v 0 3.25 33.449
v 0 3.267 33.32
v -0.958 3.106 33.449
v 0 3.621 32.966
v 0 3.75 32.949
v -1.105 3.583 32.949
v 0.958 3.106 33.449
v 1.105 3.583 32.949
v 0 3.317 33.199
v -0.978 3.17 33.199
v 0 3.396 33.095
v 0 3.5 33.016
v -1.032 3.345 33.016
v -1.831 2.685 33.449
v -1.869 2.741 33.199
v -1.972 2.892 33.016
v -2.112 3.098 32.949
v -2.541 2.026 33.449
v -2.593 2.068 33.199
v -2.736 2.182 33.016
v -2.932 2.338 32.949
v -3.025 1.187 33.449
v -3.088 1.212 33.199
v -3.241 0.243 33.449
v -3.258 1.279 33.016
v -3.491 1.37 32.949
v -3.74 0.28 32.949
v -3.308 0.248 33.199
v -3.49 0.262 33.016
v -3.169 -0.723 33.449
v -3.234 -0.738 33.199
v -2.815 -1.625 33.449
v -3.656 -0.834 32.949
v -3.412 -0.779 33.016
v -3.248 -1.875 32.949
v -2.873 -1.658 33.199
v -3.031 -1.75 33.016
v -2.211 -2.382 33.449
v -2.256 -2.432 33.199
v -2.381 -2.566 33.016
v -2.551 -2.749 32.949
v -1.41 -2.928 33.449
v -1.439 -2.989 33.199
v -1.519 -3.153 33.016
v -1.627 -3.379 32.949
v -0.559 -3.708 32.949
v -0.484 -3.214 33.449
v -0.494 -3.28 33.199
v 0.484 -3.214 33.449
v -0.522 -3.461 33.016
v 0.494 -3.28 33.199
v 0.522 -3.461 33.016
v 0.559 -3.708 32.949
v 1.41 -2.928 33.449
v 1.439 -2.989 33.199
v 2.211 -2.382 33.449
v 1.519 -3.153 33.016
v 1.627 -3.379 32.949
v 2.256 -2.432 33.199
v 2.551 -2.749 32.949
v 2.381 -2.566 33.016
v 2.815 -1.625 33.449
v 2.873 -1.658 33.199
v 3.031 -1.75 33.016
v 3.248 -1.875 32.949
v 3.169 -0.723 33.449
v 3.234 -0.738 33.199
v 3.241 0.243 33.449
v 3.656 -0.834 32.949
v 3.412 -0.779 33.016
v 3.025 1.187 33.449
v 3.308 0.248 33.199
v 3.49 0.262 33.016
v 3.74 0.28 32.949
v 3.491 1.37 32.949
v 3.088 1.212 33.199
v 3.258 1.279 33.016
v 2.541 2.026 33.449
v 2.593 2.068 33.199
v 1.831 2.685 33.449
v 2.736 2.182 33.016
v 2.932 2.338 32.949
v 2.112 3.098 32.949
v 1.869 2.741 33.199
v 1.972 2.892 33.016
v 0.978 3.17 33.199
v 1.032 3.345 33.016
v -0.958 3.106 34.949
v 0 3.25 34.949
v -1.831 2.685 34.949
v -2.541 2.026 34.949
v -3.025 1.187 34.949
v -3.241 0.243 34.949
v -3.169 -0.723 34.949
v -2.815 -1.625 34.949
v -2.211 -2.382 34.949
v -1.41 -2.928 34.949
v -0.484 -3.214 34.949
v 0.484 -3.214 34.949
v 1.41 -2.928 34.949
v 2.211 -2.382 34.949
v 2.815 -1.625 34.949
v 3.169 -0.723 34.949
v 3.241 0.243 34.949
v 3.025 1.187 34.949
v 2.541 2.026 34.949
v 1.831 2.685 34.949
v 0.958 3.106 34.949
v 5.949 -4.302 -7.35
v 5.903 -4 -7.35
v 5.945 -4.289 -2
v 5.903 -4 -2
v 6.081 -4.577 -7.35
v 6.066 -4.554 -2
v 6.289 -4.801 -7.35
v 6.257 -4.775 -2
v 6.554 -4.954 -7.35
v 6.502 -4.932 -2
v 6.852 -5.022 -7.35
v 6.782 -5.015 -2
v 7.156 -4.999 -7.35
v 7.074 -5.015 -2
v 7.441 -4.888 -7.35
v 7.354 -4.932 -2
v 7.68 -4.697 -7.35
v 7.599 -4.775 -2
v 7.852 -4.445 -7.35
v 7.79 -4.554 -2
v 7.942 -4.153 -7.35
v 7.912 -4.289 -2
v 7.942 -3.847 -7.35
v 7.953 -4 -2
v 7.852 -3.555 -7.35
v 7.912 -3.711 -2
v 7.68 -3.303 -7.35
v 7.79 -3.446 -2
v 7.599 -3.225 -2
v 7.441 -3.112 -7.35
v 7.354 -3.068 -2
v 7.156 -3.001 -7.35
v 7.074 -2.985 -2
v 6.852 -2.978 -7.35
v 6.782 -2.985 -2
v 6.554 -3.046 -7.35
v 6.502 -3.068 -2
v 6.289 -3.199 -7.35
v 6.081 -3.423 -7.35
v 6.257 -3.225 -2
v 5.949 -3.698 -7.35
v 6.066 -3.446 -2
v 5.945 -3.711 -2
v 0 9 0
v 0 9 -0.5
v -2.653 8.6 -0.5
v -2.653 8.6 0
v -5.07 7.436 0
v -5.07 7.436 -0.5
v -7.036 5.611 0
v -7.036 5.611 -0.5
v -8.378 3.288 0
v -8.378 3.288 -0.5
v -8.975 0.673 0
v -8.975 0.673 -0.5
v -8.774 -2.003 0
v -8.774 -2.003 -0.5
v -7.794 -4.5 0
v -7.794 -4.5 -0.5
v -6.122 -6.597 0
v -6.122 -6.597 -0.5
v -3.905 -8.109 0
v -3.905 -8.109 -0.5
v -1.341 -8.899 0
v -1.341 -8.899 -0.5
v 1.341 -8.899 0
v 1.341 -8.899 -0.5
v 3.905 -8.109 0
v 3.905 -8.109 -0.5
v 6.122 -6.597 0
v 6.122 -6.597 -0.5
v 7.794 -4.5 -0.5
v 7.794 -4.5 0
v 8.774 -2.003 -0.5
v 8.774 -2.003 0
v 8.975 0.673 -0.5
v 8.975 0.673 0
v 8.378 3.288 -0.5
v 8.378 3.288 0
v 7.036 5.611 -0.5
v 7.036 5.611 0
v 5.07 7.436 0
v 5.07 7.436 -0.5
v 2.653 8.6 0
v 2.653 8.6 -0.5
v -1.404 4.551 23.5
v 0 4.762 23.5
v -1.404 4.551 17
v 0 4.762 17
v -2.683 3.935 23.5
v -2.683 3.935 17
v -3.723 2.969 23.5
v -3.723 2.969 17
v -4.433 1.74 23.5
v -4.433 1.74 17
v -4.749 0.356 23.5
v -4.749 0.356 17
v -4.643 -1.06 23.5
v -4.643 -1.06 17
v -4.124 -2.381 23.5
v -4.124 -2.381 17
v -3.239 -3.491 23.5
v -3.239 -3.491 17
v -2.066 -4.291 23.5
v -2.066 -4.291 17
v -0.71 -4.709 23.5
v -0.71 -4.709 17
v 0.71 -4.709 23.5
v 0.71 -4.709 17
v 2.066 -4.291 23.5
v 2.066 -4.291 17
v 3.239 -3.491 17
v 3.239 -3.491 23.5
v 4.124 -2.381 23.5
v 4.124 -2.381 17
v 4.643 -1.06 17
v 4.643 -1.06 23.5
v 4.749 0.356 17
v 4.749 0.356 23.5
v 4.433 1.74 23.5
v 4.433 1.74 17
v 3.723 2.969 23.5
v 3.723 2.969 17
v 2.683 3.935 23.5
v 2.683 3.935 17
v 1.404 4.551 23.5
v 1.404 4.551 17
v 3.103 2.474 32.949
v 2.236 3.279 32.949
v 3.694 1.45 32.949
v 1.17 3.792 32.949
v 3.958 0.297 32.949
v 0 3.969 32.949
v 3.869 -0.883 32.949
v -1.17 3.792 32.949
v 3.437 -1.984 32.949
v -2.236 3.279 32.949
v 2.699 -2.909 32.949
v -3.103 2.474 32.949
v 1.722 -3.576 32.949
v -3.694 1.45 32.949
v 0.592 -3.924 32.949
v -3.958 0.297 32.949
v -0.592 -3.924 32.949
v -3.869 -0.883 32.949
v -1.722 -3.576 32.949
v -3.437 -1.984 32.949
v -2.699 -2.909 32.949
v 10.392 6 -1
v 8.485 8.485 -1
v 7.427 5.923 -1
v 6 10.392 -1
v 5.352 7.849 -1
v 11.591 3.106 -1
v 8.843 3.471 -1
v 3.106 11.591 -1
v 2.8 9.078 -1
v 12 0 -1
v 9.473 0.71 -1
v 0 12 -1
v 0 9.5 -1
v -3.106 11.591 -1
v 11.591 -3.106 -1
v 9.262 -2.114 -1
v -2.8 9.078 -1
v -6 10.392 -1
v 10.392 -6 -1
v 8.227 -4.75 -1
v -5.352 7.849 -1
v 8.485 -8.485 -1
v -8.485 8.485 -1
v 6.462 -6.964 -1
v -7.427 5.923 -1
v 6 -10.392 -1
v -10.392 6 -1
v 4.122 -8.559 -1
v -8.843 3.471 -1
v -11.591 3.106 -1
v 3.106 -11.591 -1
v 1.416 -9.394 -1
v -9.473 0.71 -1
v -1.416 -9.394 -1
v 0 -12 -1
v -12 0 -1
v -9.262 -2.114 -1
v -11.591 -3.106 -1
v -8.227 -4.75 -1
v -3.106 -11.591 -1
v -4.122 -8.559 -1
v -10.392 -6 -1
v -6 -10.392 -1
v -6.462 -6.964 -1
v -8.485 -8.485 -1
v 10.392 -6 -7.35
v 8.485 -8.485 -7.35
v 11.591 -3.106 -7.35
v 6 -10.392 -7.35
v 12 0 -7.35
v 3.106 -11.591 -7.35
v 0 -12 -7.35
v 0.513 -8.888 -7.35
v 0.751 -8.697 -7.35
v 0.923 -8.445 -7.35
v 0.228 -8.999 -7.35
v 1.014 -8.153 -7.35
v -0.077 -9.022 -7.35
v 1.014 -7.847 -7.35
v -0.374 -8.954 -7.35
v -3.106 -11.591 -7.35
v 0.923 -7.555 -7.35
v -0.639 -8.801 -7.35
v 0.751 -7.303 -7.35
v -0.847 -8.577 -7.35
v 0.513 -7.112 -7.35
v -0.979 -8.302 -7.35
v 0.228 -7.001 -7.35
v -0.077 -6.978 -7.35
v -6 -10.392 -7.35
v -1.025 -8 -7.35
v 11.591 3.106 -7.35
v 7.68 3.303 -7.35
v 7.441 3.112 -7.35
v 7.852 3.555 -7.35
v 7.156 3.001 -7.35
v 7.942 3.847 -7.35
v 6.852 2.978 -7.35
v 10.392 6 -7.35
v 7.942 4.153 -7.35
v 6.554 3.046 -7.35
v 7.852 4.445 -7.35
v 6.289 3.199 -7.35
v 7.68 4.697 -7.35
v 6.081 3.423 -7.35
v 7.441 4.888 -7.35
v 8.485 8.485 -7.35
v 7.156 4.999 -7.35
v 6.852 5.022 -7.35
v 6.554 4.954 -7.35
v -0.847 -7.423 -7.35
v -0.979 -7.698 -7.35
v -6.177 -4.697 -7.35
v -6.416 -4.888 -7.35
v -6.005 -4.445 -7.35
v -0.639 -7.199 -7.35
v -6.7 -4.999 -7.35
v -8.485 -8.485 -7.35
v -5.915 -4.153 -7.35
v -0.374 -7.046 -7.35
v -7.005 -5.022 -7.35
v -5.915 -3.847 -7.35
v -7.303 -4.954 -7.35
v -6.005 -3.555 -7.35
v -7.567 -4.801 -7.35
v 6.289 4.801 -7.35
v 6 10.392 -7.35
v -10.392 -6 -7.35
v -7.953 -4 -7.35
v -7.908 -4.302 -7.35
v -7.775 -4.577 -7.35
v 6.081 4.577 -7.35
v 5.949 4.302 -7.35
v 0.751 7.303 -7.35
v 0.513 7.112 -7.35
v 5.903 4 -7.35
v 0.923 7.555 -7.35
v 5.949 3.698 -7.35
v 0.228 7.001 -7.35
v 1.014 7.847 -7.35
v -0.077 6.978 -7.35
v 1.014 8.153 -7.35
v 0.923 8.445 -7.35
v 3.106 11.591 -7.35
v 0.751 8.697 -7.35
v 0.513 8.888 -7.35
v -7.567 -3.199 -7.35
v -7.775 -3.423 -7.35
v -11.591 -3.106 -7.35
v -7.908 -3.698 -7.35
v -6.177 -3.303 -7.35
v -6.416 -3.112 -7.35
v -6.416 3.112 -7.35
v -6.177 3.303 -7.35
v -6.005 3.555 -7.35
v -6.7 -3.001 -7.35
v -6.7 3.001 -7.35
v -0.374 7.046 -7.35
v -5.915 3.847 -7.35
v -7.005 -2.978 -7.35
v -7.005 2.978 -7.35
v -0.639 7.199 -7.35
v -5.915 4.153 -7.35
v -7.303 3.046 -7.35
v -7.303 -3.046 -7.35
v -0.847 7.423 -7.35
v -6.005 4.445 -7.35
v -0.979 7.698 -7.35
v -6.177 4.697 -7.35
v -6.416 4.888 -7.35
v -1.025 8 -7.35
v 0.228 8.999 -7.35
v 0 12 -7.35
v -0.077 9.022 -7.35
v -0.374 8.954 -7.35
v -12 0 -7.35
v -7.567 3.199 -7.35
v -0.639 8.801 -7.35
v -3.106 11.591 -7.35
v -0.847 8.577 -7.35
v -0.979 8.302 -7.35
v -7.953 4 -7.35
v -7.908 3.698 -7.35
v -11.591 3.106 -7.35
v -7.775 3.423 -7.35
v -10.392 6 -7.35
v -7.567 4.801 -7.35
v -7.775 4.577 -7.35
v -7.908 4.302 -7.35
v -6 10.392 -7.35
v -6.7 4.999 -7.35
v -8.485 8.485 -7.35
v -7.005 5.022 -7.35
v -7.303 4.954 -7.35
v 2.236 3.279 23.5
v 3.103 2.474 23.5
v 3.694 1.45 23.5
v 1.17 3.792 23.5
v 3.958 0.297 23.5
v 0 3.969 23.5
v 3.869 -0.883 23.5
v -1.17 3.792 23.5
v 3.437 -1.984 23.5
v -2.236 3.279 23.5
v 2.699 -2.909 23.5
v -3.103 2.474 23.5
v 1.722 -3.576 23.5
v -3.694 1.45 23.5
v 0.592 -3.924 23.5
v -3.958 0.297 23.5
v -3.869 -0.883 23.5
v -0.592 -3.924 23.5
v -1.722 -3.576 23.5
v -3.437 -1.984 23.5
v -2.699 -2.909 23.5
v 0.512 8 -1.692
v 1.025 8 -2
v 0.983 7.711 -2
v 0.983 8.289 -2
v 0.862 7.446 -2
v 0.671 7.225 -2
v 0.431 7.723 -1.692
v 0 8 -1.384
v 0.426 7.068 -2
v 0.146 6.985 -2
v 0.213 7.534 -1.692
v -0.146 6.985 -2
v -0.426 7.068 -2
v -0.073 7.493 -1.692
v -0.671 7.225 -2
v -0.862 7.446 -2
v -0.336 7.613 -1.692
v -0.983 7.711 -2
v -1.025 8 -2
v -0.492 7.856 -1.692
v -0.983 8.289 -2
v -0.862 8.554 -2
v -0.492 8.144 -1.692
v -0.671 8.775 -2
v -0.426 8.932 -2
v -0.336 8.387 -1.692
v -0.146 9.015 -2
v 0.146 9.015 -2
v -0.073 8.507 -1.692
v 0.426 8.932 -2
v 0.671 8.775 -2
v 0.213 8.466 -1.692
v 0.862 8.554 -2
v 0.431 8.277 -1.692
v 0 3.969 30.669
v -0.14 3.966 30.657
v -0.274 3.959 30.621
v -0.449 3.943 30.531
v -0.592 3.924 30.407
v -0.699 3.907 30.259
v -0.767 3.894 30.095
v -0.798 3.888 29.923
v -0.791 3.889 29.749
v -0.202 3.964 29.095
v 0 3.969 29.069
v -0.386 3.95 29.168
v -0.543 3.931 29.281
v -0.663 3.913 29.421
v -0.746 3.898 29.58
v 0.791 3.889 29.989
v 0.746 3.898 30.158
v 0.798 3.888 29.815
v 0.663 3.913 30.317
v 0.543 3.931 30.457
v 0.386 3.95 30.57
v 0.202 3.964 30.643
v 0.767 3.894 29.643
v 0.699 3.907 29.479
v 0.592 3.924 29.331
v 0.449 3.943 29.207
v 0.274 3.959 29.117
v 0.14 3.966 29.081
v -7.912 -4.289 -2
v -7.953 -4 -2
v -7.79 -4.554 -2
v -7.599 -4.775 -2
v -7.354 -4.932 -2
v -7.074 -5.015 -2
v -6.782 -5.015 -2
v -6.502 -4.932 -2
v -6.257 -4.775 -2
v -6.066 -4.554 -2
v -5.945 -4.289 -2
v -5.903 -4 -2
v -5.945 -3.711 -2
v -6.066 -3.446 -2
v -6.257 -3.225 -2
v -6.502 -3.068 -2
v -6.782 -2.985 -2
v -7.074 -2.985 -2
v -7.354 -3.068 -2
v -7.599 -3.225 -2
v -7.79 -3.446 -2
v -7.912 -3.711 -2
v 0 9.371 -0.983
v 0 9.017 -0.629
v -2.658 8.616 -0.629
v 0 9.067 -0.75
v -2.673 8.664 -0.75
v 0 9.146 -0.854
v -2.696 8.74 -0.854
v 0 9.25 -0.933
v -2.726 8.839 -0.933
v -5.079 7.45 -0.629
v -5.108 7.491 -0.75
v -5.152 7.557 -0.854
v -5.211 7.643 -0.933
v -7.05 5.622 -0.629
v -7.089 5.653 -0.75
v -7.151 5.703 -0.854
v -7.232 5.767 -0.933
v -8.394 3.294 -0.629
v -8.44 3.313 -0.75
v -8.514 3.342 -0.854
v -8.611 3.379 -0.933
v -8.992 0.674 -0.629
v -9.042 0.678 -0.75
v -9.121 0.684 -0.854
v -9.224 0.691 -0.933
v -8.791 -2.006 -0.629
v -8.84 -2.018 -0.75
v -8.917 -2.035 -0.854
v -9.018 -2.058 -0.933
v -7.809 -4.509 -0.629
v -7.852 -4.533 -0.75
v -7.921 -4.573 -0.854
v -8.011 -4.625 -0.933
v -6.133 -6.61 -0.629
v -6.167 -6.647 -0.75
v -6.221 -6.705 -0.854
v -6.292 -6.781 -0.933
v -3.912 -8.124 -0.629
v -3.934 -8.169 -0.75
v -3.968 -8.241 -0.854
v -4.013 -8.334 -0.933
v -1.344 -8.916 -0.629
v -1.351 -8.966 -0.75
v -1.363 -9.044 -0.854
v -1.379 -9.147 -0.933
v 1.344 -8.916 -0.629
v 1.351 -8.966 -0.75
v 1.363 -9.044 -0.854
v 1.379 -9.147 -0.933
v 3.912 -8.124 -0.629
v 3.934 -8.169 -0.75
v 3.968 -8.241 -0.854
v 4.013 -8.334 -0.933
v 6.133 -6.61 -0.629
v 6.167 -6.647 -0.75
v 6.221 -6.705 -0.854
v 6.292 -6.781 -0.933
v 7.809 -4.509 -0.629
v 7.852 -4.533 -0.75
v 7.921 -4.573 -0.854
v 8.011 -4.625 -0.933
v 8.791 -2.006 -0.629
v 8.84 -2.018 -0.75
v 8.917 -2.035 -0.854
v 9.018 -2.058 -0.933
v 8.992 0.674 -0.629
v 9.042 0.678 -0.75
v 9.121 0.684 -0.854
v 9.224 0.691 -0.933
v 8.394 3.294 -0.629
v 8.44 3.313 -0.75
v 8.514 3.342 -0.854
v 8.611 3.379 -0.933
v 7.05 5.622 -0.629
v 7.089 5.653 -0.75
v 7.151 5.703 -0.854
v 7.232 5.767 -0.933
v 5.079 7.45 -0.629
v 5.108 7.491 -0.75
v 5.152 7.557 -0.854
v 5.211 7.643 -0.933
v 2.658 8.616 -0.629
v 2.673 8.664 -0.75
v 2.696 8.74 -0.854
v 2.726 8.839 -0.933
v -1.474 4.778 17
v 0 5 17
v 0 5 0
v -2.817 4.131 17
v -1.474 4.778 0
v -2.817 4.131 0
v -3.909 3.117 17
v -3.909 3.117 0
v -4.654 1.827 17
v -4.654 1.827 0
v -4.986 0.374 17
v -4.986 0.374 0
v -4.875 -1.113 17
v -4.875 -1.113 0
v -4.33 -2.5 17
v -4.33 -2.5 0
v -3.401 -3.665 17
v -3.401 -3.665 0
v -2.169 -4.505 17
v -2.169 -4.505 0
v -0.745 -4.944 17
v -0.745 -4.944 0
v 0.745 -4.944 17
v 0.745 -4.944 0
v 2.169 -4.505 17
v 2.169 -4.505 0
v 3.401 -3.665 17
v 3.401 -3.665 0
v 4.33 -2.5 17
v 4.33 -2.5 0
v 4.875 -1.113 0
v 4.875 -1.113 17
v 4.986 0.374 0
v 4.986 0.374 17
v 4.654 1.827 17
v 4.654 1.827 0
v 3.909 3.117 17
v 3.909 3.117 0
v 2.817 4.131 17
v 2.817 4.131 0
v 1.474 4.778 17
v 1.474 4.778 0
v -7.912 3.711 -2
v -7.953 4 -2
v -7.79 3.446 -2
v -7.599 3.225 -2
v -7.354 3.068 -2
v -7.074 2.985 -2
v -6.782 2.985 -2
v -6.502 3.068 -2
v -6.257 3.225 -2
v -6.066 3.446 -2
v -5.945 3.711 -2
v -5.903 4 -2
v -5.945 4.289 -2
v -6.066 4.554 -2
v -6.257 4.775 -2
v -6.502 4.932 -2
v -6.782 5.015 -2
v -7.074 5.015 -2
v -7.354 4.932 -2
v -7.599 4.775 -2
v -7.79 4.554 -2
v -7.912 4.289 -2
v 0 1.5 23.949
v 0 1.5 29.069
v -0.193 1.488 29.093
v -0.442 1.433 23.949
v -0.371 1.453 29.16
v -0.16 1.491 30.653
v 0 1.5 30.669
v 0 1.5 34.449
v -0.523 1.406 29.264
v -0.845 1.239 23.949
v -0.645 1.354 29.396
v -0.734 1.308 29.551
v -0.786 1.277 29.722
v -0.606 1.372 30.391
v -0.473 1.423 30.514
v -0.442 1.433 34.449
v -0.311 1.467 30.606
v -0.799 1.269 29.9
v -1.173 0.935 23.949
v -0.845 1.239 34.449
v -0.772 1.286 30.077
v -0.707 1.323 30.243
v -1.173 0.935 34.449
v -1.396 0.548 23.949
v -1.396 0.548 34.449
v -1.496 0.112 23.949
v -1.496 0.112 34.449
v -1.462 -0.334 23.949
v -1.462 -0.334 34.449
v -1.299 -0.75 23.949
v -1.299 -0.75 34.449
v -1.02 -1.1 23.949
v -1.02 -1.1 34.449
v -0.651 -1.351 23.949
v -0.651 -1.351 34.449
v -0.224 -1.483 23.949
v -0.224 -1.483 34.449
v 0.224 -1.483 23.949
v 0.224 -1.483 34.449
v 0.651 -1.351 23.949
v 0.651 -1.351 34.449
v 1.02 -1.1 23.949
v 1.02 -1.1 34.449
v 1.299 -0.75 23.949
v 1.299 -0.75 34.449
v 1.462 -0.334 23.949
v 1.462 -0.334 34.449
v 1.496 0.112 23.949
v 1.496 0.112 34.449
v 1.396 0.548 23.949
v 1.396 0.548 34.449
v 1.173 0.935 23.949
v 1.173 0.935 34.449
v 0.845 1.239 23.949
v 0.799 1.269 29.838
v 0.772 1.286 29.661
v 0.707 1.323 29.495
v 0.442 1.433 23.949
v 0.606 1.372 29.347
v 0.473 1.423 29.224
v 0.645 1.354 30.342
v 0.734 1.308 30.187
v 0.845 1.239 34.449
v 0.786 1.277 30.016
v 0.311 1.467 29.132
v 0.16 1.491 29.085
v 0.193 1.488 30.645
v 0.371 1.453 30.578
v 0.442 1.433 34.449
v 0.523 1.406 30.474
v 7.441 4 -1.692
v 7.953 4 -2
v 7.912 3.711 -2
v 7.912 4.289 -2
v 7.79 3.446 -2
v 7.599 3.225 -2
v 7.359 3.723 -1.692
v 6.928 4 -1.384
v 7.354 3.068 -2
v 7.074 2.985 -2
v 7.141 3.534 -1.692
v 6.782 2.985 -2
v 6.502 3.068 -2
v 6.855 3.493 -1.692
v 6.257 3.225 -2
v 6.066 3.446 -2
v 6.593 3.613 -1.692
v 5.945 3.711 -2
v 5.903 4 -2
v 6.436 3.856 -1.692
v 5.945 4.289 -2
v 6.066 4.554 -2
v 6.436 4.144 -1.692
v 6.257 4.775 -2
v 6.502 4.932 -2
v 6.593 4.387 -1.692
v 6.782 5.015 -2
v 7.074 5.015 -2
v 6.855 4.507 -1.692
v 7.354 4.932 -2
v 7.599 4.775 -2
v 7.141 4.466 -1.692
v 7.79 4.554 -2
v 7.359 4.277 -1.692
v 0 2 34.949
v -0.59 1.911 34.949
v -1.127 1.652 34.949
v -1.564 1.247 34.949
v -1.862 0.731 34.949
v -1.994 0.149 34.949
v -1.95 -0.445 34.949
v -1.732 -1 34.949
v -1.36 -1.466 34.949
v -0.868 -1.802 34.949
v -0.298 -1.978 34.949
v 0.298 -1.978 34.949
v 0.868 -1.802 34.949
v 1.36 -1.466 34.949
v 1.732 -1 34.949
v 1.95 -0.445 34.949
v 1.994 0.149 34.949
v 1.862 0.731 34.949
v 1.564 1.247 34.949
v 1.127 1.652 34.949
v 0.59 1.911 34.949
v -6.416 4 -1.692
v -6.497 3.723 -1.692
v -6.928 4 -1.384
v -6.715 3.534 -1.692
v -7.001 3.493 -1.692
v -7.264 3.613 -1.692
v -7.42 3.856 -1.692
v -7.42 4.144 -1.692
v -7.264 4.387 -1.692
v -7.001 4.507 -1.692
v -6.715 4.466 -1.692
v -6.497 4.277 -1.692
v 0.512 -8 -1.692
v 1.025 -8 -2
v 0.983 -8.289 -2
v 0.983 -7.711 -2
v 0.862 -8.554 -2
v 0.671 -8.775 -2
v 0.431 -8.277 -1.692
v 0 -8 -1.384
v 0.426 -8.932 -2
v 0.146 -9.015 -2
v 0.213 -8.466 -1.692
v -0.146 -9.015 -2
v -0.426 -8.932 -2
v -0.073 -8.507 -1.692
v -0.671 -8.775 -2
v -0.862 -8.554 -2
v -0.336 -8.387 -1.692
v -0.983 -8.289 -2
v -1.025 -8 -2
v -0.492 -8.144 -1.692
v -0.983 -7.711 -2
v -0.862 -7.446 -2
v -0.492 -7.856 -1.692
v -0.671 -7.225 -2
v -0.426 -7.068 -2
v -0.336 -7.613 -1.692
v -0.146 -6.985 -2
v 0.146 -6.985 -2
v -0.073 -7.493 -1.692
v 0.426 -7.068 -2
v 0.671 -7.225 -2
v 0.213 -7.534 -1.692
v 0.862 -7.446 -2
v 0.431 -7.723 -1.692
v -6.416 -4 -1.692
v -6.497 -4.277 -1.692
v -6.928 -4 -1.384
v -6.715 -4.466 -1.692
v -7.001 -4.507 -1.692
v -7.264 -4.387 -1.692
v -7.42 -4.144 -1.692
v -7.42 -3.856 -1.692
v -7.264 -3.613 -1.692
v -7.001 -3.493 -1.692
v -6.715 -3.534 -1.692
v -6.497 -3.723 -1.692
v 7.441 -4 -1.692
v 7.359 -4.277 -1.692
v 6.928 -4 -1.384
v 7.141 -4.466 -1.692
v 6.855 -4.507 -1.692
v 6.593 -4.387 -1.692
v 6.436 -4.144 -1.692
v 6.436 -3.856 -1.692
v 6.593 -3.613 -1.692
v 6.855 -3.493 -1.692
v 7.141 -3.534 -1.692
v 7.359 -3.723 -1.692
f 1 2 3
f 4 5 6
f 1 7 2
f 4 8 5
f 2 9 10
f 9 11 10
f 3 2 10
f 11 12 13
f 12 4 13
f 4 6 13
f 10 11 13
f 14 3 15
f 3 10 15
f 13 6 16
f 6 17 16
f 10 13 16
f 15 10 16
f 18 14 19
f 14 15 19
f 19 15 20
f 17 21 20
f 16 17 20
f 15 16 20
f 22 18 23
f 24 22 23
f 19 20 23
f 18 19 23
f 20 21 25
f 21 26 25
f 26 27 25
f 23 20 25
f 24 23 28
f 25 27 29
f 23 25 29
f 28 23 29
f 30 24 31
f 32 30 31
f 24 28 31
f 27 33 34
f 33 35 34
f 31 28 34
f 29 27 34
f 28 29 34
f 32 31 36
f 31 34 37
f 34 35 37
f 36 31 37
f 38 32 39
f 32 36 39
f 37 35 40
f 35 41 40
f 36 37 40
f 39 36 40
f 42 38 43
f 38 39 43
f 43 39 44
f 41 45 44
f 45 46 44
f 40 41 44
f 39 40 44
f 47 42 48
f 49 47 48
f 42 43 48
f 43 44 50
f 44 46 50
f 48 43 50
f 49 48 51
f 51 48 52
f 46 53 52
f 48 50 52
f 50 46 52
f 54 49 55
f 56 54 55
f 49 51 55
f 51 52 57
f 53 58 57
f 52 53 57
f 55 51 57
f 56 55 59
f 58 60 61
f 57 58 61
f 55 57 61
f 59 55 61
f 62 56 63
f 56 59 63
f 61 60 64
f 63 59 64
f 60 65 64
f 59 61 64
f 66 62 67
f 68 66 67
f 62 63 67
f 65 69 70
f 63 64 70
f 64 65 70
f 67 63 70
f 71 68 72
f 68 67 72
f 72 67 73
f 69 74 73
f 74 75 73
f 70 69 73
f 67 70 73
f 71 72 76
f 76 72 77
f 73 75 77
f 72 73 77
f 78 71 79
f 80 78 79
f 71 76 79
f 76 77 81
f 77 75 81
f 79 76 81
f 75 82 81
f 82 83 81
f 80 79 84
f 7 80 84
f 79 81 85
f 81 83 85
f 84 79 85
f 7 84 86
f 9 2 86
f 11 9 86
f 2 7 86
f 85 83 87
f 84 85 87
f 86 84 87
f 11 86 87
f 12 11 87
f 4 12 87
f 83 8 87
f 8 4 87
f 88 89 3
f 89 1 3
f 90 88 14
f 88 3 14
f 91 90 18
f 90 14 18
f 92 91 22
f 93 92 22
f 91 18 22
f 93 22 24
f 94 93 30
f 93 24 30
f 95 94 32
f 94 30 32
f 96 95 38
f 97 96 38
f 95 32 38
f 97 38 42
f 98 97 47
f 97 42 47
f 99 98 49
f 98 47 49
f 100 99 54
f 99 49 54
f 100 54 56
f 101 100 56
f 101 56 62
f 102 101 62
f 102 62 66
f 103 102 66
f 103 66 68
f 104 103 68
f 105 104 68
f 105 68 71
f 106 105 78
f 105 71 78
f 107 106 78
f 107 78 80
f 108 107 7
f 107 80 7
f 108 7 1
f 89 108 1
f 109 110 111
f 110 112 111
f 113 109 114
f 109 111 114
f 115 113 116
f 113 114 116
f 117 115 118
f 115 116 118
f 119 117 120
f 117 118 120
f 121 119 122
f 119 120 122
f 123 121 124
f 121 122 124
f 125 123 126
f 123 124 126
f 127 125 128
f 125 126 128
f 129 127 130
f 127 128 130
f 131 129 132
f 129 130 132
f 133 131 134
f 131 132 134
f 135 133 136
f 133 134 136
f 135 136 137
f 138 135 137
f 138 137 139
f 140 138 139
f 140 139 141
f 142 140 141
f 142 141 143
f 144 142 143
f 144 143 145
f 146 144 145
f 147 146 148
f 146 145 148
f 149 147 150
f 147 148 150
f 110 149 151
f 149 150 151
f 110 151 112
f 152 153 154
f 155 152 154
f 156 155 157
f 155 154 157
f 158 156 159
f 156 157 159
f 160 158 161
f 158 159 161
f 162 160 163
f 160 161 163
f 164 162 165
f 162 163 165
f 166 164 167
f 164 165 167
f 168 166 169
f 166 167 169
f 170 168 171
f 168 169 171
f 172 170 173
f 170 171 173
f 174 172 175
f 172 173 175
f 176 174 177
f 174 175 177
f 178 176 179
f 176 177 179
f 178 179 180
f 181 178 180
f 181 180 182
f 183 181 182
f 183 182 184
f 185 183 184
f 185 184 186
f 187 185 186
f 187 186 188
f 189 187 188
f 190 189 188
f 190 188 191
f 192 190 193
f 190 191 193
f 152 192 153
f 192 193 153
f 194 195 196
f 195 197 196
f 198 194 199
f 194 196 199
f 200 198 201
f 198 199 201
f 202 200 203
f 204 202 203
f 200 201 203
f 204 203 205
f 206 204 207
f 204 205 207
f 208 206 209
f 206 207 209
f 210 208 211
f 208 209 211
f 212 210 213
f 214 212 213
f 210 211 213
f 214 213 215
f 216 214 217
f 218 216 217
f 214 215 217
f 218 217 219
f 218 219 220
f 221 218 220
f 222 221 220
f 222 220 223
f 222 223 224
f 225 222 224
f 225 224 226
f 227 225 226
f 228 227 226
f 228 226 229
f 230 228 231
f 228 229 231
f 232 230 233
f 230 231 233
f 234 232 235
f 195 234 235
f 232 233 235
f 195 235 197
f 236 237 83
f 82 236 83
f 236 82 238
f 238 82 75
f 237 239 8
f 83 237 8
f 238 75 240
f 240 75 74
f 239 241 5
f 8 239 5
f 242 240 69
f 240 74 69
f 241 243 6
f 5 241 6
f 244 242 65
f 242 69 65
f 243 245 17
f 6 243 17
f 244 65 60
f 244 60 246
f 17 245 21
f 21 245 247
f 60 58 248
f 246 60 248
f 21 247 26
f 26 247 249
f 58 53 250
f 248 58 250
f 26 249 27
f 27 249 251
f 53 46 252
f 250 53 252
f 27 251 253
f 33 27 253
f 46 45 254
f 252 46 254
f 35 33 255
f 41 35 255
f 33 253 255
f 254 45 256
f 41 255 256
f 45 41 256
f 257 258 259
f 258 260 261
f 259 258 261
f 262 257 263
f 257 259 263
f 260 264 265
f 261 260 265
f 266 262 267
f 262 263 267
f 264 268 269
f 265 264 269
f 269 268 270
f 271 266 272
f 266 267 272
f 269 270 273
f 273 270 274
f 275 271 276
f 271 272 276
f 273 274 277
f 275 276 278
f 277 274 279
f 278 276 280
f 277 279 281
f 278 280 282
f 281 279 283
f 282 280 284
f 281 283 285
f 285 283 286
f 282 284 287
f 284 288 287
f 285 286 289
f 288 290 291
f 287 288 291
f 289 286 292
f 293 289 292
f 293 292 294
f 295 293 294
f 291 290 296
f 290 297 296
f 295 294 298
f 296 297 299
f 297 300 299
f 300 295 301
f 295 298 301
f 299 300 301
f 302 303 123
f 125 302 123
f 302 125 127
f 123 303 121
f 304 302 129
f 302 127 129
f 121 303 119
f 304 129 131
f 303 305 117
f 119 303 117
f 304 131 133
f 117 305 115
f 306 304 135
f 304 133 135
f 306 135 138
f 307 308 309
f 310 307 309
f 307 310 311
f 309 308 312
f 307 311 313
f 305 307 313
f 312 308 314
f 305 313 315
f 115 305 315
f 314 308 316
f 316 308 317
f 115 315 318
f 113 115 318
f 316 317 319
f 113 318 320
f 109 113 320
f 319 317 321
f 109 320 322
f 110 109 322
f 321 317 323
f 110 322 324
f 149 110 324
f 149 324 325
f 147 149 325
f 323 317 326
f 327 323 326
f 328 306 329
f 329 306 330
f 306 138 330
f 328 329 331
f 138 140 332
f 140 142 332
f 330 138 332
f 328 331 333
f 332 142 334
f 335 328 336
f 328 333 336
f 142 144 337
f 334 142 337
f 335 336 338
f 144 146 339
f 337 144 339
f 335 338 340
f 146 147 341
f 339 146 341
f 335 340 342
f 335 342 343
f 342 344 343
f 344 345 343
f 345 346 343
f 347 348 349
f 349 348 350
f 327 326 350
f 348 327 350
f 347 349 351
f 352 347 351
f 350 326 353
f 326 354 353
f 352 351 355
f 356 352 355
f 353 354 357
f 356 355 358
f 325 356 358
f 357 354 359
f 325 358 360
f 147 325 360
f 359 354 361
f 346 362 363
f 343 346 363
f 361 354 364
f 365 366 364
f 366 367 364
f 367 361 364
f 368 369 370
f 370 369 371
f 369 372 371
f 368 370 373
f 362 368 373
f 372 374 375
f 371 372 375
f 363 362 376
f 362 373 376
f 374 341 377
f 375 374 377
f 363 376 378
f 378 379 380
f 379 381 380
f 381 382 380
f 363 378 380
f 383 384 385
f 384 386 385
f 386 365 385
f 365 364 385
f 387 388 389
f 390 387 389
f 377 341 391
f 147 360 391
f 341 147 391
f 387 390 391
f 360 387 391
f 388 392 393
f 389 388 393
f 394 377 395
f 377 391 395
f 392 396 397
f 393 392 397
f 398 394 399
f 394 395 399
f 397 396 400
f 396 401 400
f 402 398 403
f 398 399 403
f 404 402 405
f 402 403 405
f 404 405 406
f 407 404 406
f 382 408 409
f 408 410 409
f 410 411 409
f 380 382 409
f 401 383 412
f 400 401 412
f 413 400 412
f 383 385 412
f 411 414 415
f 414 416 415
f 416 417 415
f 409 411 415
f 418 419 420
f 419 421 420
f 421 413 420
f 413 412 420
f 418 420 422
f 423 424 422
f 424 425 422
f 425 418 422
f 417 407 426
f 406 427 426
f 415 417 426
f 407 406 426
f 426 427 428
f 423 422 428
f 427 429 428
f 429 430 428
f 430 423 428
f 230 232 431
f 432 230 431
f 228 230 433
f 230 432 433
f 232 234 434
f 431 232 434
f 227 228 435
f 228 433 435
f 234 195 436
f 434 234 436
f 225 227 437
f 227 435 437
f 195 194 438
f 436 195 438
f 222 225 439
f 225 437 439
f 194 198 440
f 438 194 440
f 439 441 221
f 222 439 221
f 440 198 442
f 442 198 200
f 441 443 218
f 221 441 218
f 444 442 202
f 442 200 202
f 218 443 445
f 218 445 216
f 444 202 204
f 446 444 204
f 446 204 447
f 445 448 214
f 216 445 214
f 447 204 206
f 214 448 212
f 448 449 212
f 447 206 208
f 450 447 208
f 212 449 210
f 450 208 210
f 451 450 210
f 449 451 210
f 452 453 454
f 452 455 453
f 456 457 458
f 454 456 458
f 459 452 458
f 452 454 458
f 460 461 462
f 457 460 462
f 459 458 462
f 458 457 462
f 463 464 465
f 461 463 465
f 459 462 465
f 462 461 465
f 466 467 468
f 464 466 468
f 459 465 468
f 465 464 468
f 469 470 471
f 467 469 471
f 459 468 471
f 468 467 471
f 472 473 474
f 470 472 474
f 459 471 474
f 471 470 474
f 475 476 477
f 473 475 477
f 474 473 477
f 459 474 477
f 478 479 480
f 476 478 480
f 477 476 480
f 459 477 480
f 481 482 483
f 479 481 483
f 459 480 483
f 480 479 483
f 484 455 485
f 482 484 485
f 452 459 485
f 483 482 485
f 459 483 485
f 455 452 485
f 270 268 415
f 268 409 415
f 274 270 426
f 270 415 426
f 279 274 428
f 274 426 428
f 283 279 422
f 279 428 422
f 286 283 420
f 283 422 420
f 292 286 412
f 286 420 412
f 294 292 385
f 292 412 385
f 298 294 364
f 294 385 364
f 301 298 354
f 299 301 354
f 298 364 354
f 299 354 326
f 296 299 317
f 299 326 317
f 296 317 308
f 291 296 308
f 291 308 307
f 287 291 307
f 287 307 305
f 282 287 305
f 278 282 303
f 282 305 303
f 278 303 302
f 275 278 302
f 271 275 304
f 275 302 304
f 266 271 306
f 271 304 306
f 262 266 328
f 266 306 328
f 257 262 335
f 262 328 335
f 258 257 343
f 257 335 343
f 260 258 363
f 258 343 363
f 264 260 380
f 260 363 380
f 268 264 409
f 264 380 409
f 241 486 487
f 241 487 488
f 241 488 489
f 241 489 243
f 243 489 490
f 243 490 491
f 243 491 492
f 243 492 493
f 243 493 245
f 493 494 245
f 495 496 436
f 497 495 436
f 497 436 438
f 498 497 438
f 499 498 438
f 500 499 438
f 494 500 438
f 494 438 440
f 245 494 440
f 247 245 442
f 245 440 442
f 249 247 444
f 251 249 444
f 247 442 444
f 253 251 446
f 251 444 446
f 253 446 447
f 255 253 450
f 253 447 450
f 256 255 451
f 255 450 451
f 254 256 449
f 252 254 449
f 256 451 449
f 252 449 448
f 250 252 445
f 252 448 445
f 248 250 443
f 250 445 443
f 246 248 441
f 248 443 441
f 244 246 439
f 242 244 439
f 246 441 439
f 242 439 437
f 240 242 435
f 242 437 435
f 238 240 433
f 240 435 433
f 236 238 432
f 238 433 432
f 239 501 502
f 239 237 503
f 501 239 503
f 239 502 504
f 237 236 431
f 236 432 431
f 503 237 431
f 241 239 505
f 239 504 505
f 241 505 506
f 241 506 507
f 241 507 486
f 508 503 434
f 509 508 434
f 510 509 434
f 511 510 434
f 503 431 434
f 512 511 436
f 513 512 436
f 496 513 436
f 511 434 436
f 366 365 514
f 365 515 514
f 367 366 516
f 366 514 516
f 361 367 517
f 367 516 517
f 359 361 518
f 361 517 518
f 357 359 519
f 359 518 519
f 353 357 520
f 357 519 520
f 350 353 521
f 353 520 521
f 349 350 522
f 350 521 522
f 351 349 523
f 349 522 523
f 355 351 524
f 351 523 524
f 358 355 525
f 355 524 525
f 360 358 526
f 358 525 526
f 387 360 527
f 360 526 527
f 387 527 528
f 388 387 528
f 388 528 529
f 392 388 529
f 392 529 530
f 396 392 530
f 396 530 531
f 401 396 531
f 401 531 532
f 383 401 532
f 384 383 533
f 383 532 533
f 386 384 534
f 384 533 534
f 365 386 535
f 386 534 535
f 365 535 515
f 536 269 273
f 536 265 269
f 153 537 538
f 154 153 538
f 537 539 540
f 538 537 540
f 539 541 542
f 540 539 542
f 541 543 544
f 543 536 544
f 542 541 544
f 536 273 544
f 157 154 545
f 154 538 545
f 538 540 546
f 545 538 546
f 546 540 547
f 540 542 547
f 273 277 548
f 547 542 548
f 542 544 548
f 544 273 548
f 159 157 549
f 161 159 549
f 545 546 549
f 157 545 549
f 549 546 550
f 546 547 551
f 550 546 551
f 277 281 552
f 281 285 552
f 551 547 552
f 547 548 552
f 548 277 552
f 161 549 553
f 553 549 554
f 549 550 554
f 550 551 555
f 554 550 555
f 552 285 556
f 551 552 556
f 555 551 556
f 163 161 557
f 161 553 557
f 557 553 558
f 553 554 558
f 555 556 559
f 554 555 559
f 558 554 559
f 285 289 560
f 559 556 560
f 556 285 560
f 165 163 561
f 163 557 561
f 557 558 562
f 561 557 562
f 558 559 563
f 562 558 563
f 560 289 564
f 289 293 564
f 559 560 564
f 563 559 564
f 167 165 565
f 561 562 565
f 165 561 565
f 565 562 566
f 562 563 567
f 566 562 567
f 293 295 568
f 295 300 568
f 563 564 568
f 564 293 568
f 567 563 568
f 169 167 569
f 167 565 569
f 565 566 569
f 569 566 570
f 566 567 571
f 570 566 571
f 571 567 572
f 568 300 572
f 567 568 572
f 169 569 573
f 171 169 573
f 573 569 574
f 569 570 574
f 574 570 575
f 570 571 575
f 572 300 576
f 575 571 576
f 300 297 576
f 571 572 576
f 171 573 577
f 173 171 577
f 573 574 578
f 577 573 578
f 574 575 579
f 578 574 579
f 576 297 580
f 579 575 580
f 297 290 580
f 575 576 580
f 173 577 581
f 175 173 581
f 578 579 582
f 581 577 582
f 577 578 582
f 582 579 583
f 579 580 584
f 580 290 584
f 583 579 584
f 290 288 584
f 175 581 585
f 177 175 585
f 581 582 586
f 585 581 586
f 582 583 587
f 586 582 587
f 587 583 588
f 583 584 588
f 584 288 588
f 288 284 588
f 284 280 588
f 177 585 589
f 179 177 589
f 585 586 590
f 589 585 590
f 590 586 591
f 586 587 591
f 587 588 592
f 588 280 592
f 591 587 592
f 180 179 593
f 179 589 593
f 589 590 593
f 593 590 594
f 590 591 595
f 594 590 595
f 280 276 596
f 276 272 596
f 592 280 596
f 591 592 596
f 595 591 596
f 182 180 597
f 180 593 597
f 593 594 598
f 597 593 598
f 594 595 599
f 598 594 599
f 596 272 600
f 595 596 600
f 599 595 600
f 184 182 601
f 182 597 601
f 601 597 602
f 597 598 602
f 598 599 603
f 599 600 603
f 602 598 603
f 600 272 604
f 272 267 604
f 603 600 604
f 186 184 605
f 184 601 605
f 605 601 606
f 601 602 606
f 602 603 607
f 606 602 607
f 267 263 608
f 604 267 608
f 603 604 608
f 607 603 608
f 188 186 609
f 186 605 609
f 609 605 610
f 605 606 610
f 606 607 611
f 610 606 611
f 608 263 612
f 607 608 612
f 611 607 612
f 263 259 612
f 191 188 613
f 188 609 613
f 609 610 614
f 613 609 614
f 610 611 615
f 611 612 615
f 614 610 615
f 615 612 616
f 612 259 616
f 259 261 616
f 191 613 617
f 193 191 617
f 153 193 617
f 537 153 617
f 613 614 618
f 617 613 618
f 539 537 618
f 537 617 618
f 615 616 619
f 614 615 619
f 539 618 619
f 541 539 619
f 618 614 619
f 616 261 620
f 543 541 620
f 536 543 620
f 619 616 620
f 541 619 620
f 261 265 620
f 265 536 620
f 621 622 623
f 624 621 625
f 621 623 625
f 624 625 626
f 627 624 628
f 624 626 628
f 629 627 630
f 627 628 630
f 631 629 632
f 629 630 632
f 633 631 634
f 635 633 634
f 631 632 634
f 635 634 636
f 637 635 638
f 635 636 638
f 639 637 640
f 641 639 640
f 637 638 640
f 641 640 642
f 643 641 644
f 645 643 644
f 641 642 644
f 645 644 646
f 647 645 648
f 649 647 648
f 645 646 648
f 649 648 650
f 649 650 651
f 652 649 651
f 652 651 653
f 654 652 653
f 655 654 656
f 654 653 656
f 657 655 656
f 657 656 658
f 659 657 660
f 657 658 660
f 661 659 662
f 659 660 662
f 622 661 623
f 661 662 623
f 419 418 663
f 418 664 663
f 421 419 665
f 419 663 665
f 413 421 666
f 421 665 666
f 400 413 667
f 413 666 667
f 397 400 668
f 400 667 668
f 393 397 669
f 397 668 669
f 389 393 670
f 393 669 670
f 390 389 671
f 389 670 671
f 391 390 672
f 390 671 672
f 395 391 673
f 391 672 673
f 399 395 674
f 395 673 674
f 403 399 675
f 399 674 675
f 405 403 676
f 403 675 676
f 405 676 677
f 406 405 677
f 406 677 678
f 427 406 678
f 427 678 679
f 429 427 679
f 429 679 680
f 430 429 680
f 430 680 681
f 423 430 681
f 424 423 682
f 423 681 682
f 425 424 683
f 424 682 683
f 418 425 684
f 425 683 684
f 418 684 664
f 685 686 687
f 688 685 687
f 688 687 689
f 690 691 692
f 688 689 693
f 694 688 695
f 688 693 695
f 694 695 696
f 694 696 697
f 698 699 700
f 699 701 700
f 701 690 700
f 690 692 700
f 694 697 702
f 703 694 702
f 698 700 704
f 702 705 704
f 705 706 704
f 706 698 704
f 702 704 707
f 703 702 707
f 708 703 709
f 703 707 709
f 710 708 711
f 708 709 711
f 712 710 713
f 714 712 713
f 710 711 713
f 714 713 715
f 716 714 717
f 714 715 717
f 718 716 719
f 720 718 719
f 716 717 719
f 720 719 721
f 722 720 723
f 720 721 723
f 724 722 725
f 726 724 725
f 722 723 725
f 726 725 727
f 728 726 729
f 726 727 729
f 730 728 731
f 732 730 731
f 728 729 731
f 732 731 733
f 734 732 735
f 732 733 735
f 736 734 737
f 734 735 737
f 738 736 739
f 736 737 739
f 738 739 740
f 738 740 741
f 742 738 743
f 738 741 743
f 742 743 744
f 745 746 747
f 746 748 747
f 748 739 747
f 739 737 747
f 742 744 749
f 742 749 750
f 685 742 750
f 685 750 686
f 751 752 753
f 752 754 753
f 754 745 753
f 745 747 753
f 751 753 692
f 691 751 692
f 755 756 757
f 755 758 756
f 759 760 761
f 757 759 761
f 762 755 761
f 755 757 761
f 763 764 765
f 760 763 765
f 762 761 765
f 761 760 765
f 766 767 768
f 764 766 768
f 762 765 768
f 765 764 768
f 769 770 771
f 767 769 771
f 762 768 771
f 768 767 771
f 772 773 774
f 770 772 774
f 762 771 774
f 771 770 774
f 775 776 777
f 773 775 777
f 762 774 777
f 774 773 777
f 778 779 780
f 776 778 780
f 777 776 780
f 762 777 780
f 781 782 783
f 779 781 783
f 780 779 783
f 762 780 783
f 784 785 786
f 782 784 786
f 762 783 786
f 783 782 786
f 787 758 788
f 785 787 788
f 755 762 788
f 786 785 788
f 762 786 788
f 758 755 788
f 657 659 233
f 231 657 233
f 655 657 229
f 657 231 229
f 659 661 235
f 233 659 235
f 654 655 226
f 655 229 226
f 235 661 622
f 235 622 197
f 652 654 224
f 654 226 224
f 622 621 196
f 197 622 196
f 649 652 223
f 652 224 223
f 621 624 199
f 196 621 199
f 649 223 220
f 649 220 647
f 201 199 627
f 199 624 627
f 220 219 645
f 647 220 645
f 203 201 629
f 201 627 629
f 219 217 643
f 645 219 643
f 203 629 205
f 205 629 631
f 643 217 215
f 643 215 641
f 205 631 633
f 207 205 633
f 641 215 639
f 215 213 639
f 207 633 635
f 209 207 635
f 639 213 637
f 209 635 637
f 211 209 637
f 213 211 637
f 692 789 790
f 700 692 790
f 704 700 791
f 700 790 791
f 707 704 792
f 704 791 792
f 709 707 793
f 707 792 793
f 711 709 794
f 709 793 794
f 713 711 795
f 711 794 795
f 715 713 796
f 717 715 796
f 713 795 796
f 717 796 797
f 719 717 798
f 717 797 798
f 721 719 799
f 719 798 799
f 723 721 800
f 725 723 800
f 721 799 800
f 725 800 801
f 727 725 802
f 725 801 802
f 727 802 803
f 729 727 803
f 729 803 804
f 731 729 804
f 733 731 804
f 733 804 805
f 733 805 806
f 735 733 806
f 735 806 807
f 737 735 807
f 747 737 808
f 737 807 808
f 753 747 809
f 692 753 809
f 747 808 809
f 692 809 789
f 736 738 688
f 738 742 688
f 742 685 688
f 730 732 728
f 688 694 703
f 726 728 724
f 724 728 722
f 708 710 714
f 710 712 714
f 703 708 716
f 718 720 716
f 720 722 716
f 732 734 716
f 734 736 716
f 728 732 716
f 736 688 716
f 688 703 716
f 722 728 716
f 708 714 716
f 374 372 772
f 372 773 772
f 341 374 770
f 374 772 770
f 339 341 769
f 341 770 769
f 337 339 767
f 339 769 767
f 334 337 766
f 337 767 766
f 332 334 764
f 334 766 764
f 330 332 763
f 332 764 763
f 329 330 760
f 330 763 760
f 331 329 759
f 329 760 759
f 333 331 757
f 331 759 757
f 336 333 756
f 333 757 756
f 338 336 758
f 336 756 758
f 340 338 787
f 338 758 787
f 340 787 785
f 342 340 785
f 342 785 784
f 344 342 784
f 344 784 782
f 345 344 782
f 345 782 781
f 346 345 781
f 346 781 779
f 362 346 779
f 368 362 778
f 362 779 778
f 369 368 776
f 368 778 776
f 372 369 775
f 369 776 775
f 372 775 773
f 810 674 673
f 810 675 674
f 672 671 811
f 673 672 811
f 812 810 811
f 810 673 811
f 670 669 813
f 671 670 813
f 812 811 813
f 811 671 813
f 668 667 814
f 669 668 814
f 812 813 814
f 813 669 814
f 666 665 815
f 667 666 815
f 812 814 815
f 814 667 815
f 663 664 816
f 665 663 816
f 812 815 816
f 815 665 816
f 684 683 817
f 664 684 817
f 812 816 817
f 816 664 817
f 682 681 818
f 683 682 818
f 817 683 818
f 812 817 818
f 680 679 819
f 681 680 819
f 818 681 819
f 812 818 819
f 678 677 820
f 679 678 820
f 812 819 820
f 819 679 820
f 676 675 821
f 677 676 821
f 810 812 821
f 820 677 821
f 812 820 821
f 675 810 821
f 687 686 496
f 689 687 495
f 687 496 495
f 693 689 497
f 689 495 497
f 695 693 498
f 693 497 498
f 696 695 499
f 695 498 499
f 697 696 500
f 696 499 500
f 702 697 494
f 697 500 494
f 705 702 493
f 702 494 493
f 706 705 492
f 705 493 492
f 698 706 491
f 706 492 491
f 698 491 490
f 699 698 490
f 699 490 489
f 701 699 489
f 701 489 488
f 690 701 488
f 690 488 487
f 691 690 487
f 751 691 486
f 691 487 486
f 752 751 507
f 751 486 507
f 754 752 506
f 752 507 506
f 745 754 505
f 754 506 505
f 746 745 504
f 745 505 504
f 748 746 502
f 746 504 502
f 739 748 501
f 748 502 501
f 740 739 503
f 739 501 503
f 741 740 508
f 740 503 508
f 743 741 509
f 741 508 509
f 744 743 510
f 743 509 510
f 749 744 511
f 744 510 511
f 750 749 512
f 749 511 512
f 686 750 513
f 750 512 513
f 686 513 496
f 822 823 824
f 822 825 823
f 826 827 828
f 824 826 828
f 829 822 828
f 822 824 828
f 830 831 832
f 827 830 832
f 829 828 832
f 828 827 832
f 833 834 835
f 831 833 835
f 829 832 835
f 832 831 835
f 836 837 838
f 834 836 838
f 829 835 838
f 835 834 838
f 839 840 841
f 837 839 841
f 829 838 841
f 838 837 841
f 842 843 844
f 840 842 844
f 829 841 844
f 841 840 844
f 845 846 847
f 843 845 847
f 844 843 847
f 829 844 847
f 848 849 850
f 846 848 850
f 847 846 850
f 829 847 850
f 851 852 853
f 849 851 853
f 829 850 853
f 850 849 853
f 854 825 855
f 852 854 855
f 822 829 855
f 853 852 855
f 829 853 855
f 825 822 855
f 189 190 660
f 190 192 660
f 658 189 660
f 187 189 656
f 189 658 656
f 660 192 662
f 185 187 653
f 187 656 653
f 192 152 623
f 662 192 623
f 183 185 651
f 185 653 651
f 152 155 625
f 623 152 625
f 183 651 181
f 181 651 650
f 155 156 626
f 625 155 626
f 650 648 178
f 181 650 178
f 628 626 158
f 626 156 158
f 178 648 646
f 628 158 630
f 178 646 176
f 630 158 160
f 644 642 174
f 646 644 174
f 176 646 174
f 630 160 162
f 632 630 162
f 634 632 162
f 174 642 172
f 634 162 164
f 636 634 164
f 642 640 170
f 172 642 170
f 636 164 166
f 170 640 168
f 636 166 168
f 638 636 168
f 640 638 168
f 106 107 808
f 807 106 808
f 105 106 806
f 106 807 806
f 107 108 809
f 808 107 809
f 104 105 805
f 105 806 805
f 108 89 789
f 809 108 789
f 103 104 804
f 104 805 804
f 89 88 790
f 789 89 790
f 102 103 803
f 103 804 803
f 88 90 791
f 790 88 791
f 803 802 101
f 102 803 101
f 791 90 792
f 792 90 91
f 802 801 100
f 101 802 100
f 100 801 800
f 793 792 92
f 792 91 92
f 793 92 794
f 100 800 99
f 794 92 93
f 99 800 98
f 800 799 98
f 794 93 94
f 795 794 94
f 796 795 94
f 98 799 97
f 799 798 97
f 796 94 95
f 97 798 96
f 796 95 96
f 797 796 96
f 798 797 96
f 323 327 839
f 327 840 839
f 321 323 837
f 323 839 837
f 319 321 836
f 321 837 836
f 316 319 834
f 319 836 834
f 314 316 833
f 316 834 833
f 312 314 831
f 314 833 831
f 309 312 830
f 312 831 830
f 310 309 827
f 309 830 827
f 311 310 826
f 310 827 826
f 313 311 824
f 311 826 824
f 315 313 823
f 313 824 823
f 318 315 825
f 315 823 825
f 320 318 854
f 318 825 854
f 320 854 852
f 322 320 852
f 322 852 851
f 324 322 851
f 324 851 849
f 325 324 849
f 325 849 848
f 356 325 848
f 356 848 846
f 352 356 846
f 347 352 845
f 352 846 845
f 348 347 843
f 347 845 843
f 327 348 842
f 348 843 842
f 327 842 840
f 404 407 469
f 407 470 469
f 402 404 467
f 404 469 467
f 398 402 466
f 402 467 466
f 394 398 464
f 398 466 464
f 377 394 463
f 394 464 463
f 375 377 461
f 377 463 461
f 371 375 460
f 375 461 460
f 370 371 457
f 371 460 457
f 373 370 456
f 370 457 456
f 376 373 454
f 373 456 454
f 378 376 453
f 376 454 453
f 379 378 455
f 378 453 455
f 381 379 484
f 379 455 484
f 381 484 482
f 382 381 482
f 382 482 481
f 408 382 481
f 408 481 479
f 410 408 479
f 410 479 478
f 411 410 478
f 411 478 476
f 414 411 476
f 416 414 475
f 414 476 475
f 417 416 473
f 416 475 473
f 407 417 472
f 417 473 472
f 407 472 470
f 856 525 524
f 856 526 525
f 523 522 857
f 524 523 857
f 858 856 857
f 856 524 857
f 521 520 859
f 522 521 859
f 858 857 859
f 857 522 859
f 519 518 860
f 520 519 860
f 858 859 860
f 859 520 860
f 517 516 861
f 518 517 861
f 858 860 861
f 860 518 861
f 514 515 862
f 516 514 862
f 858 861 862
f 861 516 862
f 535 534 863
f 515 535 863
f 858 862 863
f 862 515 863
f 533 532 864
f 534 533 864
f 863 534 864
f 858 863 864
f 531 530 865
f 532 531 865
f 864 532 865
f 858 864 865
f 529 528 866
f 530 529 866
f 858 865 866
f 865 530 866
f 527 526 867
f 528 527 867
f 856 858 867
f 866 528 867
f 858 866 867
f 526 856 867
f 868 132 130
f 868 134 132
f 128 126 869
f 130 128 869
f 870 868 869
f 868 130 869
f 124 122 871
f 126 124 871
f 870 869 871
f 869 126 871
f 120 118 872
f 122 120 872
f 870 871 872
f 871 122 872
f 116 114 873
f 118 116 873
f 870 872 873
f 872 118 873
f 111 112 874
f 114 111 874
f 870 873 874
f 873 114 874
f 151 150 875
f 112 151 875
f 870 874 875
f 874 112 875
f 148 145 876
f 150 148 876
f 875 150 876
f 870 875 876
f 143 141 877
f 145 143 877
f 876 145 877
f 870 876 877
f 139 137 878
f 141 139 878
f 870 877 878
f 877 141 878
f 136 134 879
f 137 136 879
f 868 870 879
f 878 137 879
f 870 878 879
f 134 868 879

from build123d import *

# Parameters (mm, degrees)
SKETCH4_W               = 0.8
SKETCH4_H               = 12
M2_5_TAPPED_HOLE1_D     = 2.05
M2_5_TAPPED_HOLE1_DEPTH = 5.35
M2_5_TAPPED_HOLE1_TIP   = 0.615882135
FILLET1_R               = 0.5
CHAMFER1_SIZE           = 0.5


with BuildPart() as part:
    # Sketch1 → Revolve1 (revolve)
    with BuildSketch(Plane(origin=(0, 0, 0), x_dir=(0, 0, -1), z_dir=(1, 0, 0))):
        with BuildLine():
            Line((0, 0), (-23.949, 0))
            Line((-23.949, 0), (-23.949, 1.5))
            Line((-23.949, 1.5), (-34.949, 1.5))
            Line((-34.949, 1.5), (-34.949, 3.25))
            Line((-34.949, 3.25), (-33.449, 3.25))
            ThreePointArc((-33.449, 3.25), (-33.095446609, 3.396446609), (-32.949, 3.75))
            Line((-32.949, 3.75), (-32.949, 3.96875))
            Line((-32.949, 3.96875), (-23.5, 3.96875))
            Line((-23.5, 3.96875), (-23.5, 4.7625))
            Line((-23.5, 4.7625), (-17, 4.7625))
            Line((-17, 4.7625), (-17, 5))
            Line((-17, 5), (0, 5))
            Line((0, 5), (0, 9))
            Line((0, 9), (1, 9))
            Line((1, 9), (1, 12))
            Line((1, 12), (7.35, 12))
            Line((7.35, 12), (7.35, 0))
            Line((7.35, 0), (0, 0))
        make_face()
    revolve(axis=Axis((0, 0, -7.35), (0, 0, 1)))

    # Sketch4 → M2 Tapped Hole1 (revolve, cut)
    with BuildSketch(Plane(origin=(0, 0, 29.869), x_dir=(0, 0, -1), z_dir=(1, 0, 0))):
        with Locations((0.4, 6)):
            Rectangle(SKETCH4_W, SKETCH4_H)
    revolve(axis=Axis((0, -6.35, 29.869), (0, 1, 0)), mode=Mode.SUBTRACT)

    # M2.5 Tapped Hole1
    with Locations(Plane(origin=(0, 0, -7.35), x_dir=(1, 0, 0), z_dir=(0, 0, -1))):
        with Locations((0, -8), (6.92820323, -4), (6.92820323, 4), (0, 8), (-6.92820323, 4), (-6.92820323, -4)):
            Hole(M2_5_TAPPED_HOLE1_D / 2, depth=M2_5_TAPPED_HOLE1_DEPTH)
            with Locations((0, 0, -(M2_5_TAPPED_HOLE1_DEPTH + M2_5_TAPPED_HOLE1_TIP / 2))):  # 118° drill point
                Cone(0, M2_5_TAPPED_HOLE1_D / 2, M2_5_TAPPED_HOLE1_TIP, mode=Mode.SUBTRACT)

    # Fillet1
    fillet1_edges = [part.edges().sort_by_distance(p)[0] for p in [
        (0, -9, -1),
    ]]
    fillet(fillet1_edges, radius=FILLET1_R)

    # Chamfer1
    chamfer1_edges = [part.edges().sort_by_distance(p)[0] for p in [
        (0, -1.5, 34.949),
    ]]
    chamfer(chamfer1_edges, length=CHAMFER1_SIZE)


solid = part.part
